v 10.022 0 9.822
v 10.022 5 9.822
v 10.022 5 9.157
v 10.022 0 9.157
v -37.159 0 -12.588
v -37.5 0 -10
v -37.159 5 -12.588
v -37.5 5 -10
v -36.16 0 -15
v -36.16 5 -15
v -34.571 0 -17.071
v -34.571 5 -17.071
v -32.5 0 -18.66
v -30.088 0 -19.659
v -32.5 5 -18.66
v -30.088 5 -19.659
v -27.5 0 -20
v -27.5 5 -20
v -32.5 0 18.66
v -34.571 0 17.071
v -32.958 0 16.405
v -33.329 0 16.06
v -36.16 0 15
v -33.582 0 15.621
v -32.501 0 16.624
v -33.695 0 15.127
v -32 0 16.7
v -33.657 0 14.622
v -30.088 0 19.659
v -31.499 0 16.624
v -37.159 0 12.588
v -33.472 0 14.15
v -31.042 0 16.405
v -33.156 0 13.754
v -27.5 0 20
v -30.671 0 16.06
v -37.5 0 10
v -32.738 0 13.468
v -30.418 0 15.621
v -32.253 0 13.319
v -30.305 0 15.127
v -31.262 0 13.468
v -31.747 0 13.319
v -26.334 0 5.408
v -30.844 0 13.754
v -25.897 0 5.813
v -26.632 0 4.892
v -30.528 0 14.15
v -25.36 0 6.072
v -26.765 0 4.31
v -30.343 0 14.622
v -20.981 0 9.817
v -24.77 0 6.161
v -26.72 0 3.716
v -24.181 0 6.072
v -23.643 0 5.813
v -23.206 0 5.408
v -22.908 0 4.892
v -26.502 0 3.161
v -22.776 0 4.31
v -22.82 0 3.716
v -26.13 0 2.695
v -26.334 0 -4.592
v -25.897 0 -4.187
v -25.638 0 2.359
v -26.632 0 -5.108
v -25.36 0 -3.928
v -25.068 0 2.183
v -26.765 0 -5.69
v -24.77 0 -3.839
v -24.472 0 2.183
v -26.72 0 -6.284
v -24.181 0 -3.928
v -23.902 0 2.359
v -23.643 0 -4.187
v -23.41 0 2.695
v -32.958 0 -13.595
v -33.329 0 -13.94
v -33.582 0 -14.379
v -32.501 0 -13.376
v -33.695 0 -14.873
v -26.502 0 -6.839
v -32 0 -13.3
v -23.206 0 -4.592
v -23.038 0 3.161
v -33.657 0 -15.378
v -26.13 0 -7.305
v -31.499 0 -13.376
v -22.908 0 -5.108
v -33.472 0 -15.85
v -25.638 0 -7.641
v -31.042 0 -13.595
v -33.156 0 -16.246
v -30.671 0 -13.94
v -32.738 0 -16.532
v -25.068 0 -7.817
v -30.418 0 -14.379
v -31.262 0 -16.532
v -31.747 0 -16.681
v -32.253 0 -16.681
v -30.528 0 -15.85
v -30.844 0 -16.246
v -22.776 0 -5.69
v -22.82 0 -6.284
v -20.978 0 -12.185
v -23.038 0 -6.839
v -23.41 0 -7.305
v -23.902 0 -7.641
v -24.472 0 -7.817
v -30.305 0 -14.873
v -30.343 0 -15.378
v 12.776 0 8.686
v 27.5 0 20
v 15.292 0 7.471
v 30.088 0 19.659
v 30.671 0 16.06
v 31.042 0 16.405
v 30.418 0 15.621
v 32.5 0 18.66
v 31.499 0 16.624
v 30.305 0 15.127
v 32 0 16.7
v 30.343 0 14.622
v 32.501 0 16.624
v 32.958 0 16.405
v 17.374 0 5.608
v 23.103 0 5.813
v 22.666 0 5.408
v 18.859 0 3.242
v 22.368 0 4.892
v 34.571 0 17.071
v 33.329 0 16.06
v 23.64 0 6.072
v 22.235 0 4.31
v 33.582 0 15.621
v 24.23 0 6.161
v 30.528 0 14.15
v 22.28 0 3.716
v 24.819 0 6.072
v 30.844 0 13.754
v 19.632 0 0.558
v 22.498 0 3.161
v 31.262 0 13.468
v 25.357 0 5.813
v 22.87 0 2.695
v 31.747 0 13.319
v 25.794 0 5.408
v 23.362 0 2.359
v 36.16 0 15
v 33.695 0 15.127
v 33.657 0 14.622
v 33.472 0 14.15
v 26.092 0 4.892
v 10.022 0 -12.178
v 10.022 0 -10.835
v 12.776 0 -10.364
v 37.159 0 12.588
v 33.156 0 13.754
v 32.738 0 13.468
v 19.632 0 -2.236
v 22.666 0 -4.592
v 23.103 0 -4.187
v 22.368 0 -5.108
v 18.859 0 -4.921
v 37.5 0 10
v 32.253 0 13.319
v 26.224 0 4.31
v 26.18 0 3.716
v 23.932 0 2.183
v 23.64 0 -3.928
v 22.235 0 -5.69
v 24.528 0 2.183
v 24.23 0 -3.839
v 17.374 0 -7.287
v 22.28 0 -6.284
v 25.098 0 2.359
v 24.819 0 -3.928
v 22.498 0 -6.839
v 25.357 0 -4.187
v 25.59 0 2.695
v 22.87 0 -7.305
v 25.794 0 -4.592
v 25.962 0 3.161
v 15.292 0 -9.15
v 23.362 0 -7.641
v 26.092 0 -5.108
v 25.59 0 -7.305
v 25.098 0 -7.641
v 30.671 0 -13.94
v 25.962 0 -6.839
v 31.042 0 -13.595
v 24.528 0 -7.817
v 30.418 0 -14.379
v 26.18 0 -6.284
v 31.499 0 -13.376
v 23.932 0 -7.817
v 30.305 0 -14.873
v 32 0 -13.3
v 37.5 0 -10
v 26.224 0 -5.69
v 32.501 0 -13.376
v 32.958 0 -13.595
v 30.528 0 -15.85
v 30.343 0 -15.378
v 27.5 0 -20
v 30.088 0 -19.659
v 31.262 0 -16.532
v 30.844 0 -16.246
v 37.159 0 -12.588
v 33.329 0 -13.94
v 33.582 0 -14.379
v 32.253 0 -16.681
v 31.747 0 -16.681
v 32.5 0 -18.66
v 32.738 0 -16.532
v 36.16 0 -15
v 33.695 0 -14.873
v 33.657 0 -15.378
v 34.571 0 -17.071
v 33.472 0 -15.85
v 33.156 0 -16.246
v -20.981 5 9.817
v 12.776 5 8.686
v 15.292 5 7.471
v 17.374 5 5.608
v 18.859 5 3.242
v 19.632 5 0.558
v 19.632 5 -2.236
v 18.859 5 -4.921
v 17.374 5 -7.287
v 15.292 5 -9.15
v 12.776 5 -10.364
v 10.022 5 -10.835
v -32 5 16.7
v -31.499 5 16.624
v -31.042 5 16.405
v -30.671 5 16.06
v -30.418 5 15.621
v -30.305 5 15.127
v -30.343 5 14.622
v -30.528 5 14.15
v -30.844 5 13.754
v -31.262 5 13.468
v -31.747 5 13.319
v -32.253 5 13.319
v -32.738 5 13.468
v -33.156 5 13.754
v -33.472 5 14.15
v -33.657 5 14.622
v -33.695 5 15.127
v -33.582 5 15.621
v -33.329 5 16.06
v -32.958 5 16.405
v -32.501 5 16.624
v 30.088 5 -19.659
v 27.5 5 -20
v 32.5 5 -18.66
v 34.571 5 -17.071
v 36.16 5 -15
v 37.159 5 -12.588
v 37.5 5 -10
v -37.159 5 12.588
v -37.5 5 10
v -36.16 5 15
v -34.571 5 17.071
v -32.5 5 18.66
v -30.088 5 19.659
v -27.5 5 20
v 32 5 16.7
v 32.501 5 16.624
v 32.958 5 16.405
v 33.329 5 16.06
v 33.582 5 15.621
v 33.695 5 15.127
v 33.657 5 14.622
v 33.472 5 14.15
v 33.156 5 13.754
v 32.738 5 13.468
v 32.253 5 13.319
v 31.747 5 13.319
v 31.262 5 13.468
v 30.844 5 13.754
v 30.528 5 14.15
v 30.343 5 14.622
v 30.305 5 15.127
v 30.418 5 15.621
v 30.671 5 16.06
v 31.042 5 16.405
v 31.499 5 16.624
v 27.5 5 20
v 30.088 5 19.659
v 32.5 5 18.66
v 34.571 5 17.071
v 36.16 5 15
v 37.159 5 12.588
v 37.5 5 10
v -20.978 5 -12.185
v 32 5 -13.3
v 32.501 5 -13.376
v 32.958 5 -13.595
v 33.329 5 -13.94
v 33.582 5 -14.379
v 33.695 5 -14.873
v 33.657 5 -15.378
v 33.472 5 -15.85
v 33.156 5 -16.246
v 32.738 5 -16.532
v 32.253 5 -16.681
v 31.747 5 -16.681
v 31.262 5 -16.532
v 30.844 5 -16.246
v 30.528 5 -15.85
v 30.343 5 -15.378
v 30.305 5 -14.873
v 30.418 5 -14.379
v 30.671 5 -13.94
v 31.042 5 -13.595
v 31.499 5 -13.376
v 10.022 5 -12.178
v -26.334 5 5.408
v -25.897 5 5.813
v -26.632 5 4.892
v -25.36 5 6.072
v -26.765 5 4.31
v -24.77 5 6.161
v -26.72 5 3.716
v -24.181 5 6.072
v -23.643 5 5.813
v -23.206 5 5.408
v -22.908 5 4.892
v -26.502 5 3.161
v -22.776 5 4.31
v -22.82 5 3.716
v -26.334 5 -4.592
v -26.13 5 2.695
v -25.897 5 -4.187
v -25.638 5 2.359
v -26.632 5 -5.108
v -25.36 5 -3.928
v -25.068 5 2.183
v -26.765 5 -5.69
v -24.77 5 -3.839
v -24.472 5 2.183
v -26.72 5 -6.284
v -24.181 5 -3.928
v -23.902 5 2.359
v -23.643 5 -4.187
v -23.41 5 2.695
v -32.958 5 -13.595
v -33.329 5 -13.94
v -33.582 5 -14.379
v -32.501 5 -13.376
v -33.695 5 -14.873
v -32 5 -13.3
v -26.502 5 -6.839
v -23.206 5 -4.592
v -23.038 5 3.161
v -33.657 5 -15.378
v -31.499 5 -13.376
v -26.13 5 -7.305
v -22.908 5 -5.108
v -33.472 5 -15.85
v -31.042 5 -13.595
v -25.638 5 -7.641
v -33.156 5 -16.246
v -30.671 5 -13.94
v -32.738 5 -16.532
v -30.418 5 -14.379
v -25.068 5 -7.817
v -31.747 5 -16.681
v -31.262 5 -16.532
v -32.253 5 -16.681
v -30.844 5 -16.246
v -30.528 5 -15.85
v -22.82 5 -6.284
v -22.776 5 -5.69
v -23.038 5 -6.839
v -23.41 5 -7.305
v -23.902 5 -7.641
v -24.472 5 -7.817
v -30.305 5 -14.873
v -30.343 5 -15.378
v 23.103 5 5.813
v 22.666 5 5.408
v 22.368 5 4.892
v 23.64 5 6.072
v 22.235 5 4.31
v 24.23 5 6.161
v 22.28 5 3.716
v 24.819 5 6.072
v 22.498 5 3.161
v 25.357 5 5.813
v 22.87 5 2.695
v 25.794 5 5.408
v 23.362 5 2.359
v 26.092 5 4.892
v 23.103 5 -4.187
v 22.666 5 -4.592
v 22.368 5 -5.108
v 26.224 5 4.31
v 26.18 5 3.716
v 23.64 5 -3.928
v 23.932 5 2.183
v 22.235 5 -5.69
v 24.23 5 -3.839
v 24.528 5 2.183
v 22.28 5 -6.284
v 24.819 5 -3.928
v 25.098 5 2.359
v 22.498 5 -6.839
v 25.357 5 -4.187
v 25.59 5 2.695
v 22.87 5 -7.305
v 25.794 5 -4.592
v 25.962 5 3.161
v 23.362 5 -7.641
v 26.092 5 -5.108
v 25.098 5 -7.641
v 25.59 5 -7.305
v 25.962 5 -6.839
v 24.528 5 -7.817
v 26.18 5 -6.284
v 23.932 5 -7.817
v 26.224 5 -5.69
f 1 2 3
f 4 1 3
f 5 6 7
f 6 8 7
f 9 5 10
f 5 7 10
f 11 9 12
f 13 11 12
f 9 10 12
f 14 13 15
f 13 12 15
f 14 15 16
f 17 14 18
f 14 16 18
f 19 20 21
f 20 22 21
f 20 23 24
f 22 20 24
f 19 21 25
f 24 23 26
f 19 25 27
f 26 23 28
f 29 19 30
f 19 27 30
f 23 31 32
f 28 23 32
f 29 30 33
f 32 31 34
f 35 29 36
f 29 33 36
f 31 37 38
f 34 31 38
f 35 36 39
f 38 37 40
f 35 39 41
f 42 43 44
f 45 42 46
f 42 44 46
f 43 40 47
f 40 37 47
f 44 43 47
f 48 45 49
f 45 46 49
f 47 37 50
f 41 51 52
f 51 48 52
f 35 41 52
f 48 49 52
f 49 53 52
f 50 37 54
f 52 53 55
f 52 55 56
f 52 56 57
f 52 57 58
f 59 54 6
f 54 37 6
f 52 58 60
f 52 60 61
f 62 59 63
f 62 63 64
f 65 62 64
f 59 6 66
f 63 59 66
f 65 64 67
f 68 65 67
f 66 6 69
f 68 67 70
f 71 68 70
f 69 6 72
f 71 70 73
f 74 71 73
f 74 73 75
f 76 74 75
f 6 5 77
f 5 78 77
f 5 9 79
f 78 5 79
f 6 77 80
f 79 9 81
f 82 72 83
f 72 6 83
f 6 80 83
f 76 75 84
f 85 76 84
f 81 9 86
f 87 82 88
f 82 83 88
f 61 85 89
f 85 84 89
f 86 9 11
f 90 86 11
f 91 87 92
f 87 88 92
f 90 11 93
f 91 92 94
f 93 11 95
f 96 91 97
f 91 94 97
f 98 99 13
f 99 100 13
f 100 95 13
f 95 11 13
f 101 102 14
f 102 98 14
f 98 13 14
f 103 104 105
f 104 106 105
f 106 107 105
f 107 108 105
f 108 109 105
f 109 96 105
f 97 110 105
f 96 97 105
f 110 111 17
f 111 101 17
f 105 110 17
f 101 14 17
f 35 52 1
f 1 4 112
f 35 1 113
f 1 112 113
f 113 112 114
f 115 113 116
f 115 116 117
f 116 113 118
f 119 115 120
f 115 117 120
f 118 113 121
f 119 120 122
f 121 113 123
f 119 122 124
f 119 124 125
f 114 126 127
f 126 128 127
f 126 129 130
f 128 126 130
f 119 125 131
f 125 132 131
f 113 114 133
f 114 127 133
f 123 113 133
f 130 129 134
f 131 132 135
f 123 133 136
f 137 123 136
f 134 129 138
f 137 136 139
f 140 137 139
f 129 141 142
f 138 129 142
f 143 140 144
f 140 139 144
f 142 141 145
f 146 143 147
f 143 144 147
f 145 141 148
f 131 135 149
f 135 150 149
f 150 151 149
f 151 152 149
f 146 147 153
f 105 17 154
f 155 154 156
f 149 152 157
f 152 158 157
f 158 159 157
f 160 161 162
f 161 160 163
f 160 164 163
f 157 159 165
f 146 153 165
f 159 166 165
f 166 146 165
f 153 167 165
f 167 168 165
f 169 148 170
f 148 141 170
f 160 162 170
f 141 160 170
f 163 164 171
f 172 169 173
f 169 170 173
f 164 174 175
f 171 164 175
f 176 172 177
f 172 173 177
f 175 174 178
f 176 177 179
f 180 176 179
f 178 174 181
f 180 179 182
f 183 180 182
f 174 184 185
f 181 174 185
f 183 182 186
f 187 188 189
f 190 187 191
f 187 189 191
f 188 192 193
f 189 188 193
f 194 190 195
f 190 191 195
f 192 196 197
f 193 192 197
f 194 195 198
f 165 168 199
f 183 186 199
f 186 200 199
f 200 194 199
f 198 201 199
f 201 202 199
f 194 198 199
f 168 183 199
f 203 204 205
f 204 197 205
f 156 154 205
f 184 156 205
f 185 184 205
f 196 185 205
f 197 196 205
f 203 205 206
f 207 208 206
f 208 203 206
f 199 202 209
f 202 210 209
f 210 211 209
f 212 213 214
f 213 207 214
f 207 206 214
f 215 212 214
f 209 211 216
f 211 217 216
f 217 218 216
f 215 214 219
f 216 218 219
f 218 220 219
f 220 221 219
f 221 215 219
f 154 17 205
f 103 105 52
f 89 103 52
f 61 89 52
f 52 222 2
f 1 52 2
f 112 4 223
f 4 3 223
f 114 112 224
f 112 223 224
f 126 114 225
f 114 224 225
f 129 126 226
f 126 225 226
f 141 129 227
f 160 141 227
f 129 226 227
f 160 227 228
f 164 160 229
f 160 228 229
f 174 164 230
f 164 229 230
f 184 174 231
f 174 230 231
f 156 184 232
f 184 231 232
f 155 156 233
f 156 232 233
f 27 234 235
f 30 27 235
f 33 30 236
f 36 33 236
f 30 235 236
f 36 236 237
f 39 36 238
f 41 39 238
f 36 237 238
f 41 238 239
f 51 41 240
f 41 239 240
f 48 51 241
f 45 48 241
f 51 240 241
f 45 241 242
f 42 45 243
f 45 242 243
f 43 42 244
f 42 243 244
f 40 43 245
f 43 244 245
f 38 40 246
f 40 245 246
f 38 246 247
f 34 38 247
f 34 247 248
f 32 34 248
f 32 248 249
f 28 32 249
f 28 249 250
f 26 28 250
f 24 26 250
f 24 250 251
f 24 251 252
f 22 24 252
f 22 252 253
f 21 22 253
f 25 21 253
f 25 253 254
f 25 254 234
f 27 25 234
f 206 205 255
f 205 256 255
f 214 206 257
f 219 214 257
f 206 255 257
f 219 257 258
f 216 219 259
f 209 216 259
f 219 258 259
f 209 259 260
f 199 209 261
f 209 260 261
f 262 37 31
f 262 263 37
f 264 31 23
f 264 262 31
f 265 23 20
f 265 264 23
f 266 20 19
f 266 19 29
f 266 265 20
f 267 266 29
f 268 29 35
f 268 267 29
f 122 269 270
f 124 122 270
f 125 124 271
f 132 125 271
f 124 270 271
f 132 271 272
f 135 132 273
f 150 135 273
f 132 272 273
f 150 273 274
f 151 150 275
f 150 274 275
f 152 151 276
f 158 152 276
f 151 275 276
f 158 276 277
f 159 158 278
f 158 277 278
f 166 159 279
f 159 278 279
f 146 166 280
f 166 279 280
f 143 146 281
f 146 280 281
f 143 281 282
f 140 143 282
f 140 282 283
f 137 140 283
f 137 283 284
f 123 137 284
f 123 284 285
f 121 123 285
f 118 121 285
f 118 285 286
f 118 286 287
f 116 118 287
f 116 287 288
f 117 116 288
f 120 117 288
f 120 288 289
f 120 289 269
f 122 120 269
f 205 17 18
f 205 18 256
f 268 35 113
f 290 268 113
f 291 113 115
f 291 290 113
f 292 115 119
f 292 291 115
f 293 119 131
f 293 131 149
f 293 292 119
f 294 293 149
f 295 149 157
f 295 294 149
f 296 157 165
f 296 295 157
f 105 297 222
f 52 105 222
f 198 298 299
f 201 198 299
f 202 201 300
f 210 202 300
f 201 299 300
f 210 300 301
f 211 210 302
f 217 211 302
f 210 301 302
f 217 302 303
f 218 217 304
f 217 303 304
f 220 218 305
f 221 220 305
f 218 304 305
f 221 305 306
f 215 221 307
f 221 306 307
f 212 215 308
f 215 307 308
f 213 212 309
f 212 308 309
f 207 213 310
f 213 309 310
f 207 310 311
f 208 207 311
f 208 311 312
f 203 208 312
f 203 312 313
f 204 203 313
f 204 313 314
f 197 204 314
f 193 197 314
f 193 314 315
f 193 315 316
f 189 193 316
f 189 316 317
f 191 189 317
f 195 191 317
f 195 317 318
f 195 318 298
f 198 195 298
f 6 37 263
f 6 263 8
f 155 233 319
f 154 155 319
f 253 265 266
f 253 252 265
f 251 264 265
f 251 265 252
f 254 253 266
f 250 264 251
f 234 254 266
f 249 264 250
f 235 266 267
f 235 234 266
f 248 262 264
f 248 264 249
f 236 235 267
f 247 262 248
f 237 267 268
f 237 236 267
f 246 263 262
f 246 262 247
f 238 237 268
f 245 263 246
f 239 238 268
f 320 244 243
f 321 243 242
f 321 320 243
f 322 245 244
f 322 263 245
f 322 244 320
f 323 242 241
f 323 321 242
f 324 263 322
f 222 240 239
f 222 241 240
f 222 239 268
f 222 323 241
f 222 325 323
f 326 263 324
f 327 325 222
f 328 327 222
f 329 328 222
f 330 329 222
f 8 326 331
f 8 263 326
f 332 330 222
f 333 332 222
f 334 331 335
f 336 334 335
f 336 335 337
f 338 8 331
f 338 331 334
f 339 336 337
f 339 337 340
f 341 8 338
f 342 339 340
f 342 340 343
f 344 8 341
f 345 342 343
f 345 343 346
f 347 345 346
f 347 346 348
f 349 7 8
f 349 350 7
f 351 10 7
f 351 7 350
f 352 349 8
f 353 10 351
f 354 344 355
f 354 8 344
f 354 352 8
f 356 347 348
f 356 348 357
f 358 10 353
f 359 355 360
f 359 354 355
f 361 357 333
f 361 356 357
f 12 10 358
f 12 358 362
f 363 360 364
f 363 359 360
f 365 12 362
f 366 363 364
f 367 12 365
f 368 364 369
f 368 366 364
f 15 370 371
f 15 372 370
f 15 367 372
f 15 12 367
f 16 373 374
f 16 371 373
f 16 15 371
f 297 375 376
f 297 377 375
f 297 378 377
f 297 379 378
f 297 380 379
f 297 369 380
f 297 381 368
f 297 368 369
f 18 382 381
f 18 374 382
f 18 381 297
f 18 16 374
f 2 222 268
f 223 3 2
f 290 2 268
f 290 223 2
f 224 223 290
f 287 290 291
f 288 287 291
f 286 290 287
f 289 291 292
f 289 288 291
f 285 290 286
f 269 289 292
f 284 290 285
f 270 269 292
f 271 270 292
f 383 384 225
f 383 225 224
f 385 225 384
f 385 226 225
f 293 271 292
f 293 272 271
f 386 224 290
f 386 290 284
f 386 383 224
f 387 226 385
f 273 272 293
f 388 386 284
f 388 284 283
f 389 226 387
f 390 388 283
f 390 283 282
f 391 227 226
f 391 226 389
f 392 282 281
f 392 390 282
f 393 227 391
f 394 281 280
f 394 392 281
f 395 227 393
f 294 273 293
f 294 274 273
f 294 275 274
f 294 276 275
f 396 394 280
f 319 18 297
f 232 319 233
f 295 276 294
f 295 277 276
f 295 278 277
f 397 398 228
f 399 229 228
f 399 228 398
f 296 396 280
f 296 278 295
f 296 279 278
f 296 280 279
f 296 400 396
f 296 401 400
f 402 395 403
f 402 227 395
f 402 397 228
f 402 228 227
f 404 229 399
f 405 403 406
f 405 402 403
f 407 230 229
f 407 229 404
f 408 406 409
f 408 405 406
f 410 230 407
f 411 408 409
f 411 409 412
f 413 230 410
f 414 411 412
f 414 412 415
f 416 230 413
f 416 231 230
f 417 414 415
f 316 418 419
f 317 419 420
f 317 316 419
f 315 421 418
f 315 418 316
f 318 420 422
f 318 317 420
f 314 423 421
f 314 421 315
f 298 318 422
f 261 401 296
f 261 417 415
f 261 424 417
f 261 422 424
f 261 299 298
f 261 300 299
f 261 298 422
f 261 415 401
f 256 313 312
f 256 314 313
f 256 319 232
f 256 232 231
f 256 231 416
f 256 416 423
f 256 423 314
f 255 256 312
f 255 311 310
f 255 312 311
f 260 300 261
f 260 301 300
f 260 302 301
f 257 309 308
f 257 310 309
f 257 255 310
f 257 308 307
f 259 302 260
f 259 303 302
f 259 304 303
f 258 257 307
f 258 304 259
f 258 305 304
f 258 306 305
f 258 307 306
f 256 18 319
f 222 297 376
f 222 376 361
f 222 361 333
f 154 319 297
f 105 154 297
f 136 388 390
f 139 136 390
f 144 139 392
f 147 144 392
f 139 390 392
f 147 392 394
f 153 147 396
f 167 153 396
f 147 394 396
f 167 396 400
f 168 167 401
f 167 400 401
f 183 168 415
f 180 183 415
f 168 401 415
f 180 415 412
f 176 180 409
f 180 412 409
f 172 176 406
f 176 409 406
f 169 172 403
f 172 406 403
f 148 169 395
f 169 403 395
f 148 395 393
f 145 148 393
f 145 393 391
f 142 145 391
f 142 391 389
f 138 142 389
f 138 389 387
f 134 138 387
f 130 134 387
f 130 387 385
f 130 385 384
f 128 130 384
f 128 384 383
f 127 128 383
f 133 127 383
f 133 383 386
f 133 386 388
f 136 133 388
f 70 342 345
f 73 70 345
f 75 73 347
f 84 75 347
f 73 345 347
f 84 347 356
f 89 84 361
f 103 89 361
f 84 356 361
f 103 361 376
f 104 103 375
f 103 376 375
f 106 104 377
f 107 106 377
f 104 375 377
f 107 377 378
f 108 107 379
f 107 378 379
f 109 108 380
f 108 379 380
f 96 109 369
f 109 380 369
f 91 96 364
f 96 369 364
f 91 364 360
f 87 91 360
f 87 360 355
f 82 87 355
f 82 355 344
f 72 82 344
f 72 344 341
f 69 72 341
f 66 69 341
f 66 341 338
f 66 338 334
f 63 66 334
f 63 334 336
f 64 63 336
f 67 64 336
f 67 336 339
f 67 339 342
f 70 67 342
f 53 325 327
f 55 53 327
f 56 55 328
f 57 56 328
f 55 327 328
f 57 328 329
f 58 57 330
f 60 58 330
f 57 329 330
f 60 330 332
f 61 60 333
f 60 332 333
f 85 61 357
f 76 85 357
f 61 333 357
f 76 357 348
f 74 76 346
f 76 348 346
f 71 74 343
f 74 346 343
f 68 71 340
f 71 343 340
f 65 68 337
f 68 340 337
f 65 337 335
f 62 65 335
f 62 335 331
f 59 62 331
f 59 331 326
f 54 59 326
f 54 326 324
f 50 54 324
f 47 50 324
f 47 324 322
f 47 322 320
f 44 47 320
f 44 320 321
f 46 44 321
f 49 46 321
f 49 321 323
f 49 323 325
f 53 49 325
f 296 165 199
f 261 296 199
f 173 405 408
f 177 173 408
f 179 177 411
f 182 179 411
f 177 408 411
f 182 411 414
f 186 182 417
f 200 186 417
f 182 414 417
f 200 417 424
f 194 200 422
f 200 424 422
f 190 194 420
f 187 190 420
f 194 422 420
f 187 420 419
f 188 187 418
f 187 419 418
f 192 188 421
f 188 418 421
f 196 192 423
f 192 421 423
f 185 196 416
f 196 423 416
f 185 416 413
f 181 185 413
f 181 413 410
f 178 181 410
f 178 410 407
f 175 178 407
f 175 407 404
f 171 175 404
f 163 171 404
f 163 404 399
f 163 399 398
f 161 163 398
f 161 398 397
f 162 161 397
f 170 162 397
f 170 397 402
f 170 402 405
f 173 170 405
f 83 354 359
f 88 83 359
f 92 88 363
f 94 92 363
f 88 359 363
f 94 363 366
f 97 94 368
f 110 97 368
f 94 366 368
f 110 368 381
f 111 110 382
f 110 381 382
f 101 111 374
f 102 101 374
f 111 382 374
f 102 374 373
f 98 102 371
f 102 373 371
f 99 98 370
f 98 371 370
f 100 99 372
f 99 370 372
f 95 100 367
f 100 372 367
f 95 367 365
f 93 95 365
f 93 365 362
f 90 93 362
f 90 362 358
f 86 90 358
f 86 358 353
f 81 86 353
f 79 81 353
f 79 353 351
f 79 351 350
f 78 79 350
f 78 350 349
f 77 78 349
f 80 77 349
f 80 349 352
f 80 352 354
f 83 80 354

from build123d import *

# Parameters (mm, degrees)
SKETCH9_W           = 75
SKETCH9_H           = 40
BOSS_EXTRUDE5_DEPTH = 5
SKETCH10_R          = 10
SKETCH10_R_2        = 8
SKETCH10_R_3        = 2
CUT_EXTRUDE5_DEPTH  = 43.793106922
SKETCH11_R          = 1.7
CUT_EXTRUDE6_DEPTH  = 43.793106922
FILLET1_R           = 10


with BuildPart() as part:
    # Sketch9 → Boss-Extrude5 (new body)
    with BuildSketch(Plane(origin=(0, 0, 0), x_dir=(1, 0, 0), z_dir=(0, 1, 0))):
        Rectangle(SKETCH9_W, SKETCH9_H)
    extrude(amount=BOSS_EXTRUDE5_DEPTH)

    # Sketch10 → Cut-Extrude5 (cut, through all)
    # profile 1 of 12: a face of its own
    with BuildSketch(Plane(origin=(0, 5, 0), x_dir=(1, 0, 0), z_dir=(0, 1, 0))):
        with Locations((9.729894245, 0.839124812)):
            Circle(SKETCH10_R)
    # profile 2 of 12: a face of its own
    with BuildSketch(Plane(origin=(0, 5, 0), x_dir=(1, 0, 0), z_dir=(0, 1, 0))):
        Polygon((10.022213237, -9.821914184), (10.022213237, 12.178085816), (-20.977786763, 12.184810323), (-20.9811162, -9.817222635), align=None)
        with Locations((-3.270105755, 0.839124812)):
            Circle(SKETCH10_R_2, mode=Mode.SUBTRACT)
    # profile 3 of 12: a face of its own
    with BuildSketch(Plane(origin=(0, 5, 0), x_dir=(1, 0, 0), z_dir=(0, 1, 0))):
        with BuildLine():
            ThreePointArc((19.729894245, 0.839124812), (16.903567987, 7.806075726), (10.022213237, 10.834851379))
            Line((10.022213237, 10.834851379), (10.022213237, -9.156601756))
            ThreePointArc((10.022213237, -9.156601756), (16.903567987, -6.127826103), (19.729894245, 0.839124812))
        make_face()
    # profile 4 of 12: a face of its own
    with BuildSketch(Plane(origin=(0, 5, 0), x_dir=(1, 0, 0), z_dir=(0, 1, 0))):
        with BuildLine():
            Line((10.022213237, -9.156601756), (10.022213237, 10.834851379))
            ThreePointArc((10.022213237, 10.834851379), (5.474717618, 9.888626006), (1.845278861, 6.989965424))
            ThreePointArc((1.845278861, 6.989965424), (3.972928034, 4.235955914), (4.729894245, 0.839124812))
            ThreePointArc((4.729894245, 0.839124812), (3.972928034, -2.557706291), (1.845278861, -5.311715801))
            ThreePointArc((1.845278861, -5.311715801), (5.474717618, -8.210376383), (10.022213237, -9.156601756))
        make_face()
    # profile 5 of 12: a face of its own
    with BuildSketch(Plane(origin=(0, 5, 0), x_dir=(1, 0, 0), z_dir=(0, 1, 0))):
        with Locations((9.729894245, 0.839124812)):
            Circle(SKETCH10_R)
    # profile 6 of 12: a face of its own
    with BuildSketch(Plane(origin=(0, 5, 0), x_dir=(1, 0, 0), z_dir=(0, 1, 0))):
        with Locations((-3.270105755, 0.839124812)):
            Circle(SKETCH10_R_2)
    # profile 7 of 12: a face of its own
    with BuildSketch(Plane(origin=(0, 5, 0), x_dir=(1, 0, 0), z_dir=(0, 1, 0))):
        with Locations((9.729894245, 0.839124812)):
            Circle(SKETCH10_R)
    # profile 8 of 12: a face of its own
    with BuildSketch(Plane(origin=(0, 5, 0), x_dir=(1, 0, 0), z_dir=(0, 1, 0))):
        with Locations((-3.270105755, 0.839124812)):
            Circle(SKETCH10_R_2)
    # profile 9 of 12: a face of its own
    with BuildSketch(Plane(origin=(0, 5, 0), x_dir=(1, 0, 0), z_dir=(0, 1, 0))):
        with Locations(Location((24.229894245, 5.839124812, 0), (0, 0, 270))):
            Circle(SKETCH10_R_3)
    # profile 10 of 12: a face of its own
    with BuildSketch(Plane(origin=(0, 5, 0), x_dir=(1, 0, 0), z_dir=(0, 1, 0))):
        with Locations(Location((24.229894245, -4.160875188, 0), (0, 0, 270))):
            Circle(SKETCH10_R_3)
    # profile 11 of 12: a face of its own
    with BuildSketch(Plane(origin=(0, 5, 0), x_dir=(1, 0, 0), z_dir=(0, 1, 0))):
        with Locations(Location((-24.770105755, 5.839124812, 0), (0, 0, 270))):
            Circle(SKETCH10_R_3)
    # profile 12 of 12: a face of its own
    with BuildSketch(Plane(origin=(0, 5, 0), x_dir=(1, 0, 0), z_dir=(0, 1, 0))):
        with Locations(Location((-24.770105755, -4.160875188, 0), (0, 0, 270))):
            Circle(SKETCH10_R_3)
    extrude(amount=-CUT_EXTRUDE5_DEPTH, mode=Mode.SUBTRACT)

    # Sketch11 → Cut-Extrude6 (cut, through all)
    with BuildSketch(Plane(origin=(0, 5, 0), x_dir=(1, 0, 0), z_dir=(0, 1, 0))):
        with Locations(Location((-32, 15, 0), (0, 0, 270))):
            Circle(SKETCH11_R)
        with Locations(Location((32, 15, 0), (0, 0, 270))):
            Circle(SKETCH11_R)
        with Locations(Location((32, -15, 0), (0, 0, 270))):
            Circle(SKETCH11_R)
        with Locations(Location((-32, -15, 0), (0, 0, 270))):
            Circle(SKETCH11_R)
    extrude(amount=-CUT_EXTRUDE6_DEPTH, mode=Mode.SUBTRACT)

    # Fillet1
    fillet1_edges = [part.edges().sort_by_distance(p)[0] for p in [
        (37.5, 2.5, 20),
        (-37.5, 2.5, 20),
        (-37.5, 2.5, -20),
        (37.5, 2.5, -20),
    ]]
    fillet(fillet1_edges, radius=FILLET1_R)


solid = part.part
